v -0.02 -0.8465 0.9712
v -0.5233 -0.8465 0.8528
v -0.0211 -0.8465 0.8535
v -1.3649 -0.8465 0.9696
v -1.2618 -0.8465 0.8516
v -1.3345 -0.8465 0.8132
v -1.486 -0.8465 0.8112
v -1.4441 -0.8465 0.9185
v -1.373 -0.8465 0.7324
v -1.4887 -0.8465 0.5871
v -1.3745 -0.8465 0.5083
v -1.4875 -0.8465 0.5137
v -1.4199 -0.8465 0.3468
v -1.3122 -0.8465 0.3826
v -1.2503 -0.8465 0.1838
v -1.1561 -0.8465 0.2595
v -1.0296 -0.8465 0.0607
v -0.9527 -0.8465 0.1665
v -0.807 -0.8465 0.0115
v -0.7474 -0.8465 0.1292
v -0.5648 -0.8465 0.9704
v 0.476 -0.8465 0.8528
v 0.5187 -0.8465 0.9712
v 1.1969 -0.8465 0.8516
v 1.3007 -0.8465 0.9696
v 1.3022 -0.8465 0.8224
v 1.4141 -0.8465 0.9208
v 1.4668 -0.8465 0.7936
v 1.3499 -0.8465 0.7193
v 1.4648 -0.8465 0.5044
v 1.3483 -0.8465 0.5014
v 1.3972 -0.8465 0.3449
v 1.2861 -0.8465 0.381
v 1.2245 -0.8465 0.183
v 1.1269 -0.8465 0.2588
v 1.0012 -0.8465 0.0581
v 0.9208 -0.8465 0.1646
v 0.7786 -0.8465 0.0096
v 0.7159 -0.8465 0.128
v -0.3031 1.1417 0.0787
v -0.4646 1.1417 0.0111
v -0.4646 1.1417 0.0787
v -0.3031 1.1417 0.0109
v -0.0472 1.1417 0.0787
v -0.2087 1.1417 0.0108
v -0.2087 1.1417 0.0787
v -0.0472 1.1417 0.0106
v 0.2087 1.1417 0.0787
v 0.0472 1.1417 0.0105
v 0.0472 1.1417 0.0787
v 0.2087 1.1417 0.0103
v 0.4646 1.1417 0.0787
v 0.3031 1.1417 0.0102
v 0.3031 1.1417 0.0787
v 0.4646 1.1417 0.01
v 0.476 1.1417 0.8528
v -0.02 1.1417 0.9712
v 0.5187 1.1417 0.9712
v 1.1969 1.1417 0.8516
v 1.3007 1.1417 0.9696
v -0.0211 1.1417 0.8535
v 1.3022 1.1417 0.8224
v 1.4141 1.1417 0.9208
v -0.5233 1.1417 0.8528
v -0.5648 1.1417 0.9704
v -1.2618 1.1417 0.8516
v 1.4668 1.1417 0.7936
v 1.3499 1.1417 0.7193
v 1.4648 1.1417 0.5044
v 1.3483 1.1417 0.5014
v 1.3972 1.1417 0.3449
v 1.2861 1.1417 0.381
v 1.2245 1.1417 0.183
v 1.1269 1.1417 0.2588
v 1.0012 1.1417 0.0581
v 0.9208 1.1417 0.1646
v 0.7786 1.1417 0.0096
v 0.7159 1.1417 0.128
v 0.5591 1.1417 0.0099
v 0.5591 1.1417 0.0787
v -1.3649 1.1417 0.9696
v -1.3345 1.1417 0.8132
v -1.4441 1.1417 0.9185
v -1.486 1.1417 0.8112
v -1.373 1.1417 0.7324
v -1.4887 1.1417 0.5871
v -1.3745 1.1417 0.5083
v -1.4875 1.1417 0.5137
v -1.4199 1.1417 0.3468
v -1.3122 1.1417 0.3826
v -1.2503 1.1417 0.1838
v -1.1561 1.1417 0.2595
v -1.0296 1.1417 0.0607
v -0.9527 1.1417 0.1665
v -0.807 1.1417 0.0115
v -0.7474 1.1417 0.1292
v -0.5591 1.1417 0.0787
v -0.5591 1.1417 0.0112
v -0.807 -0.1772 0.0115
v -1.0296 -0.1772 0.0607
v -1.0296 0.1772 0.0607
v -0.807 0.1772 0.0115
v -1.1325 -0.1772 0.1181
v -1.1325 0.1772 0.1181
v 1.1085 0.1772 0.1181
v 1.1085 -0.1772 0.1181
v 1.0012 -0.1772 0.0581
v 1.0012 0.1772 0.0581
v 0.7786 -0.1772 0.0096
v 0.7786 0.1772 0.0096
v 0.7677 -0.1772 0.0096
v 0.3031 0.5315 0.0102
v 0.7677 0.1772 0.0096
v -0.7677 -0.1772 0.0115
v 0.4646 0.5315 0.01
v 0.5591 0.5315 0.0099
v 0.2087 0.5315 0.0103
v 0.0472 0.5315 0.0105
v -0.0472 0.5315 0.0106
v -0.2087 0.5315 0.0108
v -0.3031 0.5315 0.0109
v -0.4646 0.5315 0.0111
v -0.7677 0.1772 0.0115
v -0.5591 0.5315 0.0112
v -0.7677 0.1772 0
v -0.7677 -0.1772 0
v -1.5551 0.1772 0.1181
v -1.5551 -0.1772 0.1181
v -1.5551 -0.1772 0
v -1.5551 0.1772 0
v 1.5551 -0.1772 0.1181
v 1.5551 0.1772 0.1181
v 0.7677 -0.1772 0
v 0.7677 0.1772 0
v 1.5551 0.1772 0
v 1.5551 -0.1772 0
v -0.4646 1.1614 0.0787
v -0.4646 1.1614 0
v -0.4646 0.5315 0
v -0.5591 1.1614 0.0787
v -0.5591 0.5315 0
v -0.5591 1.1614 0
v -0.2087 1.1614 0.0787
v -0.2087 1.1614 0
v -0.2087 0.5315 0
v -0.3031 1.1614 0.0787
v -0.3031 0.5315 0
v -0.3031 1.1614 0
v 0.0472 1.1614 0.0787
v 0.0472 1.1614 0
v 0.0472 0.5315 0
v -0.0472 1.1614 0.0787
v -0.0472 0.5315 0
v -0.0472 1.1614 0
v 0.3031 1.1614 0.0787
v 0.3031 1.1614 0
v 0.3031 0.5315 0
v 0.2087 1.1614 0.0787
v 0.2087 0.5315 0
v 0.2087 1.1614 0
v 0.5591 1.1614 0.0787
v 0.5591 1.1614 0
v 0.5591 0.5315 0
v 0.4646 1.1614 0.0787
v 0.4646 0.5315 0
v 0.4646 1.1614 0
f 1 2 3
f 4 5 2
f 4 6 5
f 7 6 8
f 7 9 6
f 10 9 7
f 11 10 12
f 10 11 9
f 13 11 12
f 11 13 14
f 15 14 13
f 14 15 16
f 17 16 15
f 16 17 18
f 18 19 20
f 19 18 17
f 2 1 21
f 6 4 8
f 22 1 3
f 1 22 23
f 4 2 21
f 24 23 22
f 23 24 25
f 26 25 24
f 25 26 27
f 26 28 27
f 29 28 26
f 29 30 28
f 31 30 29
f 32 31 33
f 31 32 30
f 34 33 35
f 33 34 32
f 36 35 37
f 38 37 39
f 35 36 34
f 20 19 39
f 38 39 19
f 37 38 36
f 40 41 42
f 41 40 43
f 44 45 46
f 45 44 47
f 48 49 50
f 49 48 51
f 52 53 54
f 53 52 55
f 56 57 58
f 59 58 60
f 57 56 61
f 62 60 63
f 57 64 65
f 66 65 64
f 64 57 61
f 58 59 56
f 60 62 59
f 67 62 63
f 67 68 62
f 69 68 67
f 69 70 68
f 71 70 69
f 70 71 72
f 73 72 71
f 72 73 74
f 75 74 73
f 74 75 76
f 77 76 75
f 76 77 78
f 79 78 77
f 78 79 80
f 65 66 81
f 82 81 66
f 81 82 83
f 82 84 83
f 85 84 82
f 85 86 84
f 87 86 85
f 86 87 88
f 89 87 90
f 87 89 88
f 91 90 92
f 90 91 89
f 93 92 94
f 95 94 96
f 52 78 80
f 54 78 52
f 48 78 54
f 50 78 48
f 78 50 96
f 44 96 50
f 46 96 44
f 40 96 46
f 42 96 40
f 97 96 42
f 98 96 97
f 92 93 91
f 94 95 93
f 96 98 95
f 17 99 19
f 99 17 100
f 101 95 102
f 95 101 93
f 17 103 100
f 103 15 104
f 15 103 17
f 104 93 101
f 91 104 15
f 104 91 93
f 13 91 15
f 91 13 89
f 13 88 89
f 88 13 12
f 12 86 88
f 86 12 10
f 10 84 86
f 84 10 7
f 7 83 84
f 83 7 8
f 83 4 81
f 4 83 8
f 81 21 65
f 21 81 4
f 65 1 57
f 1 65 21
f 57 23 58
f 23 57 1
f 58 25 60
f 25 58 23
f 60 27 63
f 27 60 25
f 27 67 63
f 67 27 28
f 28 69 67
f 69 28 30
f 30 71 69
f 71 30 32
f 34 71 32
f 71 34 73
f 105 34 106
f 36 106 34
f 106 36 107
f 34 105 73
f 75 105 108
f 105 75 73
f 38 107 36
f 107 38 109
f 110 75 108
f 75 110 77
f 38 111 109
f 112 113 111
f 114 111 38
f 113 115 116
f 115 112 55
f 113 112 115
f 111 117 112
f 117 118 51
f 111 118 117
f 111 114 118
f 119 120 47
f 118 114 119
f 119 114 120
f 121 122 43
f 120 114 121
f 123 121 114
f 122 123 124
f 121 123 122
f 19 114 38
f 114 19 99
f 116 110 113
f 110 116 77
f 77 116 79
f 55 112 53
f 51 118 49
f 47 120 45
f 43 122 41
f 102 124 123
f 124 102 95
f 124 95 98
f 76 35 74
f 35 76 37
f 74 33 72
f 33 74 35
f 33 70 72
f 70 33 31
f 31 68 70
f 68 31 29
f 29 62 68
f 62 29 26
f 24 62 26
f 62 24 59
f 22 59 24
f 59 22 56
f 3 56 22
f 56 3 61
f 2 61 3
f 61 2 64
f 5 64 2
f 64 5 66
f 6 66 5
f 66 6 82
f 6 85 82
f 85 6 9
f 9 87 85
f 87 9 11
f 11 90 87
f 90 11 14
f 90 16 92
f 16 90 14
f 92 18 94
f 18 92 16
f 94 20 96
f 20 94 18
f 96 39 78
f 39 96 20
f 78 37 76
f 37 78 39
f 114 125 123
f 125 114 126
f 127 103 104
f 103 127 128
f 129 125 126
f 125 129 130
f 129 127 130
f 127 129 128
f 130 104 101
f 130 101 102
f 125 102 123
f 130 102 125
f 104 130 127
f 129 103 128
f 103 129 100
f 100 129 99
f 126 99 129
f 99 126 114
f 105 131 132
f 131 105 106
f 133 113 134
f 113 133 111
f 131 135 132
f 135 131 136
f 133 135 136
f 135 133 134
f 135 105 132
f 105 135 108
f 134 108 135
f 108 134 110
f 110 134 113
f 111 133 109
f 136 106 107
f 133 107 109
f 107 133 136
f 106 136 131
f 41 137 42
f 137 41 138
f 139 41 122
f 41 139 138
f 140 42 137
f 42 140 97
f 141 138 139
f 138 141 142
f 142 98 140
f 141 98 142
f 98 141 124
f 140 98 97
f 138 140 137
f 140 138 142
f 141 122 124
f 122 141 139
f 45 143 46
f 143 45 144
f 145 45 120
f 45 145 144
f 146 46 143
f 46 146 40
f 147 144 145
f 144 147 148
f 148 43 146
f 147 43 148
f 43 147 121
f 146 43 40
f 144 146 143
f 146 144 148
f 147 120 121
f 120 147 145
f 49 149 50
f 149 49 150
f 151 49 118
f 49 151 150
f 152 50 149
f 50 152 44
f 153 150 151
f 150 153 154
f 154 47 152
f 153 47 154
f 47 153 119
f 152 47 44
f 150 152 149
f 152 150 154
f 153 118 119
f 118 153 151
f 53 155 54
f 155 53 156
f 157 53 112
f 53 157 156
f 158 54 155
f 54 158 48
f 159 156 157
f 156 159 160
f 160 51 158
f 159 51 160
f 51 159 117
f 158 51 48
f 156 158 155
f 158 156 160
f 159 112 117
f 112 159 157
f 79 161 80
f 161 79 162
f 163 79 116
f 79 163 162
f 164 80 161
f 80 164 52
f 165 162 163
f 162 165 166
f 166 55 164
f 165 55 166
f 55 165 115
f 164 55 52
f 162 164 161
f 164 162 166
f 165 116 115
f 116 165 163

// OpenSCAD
// file: defines.scad
// example012.stl is Mblock.stl, (c) 2009 Will Langford
// licensed under the Creative Commons - GNU GPL license.
// http://www.thingiverse.com/thing:753

//import("sim800c.stl", convexity=3);

// PCB

$fn = 64;

scale = 1/2.54;
// file: USB_MICRO_10118192-0001LF-pins.scad
include <defines.scad>


Pin_w = 0.24;
Pin_h = 1.60;
Pin_u = 0.2;

// Смещение края вывода относительно оси
Pin_edge = 5.10 - 2.15;

module Pin() {
  translate([-Pin_w/2, Pin_edge-Pin_h, 0]) cube([Pin_w, Pin_h, Pin_u], center=false);

}

// Pins
scale(scale) color("Silver") {
  translate([-1.30, 0, 0]) Pin();
  translate([-0.65, 0, 0]) Pin();
  Pin();
  translate([0.65, 0, 0]) Pin();
  translate([1.30, 0, 0]) Pin();

}
// file: USB_MICRO_10118192-0001LF-body.scad
include <defines.scad>

// Толщина металла.
Wh = 0.3;

// Внутренний размер
Win = 6.9;
Hin = 1.85;

// Длина ровной части
L = 5.05;

// Смещение относительно оси координат
Loff = 2.15;

scale(scale) color("Gray") {
  /*cube([7.5, 5.05, 2.80], center = true);*/

  /*translate([0,0,-Loff])
  linear_extrude(height = L, center = false)
    polygon([
      [-Win/2, Hin/2],
      [ Win/2, Hin/2],
      [ Win/2, -Hin/2],
      [-Win/2, -Hin/2]
    ]);*/
  rotate([90, 0, 180])
  translate([-7.5/2, 0, -Loff])
  linear_extrude(height = L, center = false, convexity = 10)
    import (file = "cover-shape1.dxf");


  translate([-7.90/2, -0.9/2, 0]) cube([2.0, 0.9, 0.3], center=false);
  mirror([1,0,0]) translate([-7.90/2, -0.9/2, 0]) cube([2.0, 0.9, 0.3], center=false);

}
// main file
include <USB_MICRO_10118192-0001LF-body.scad>
include <USB_MICRO_10118192-0001LF-pins.scad>
/*include <USB_MICRO_10118192-0001LF-cover.scad>*/
